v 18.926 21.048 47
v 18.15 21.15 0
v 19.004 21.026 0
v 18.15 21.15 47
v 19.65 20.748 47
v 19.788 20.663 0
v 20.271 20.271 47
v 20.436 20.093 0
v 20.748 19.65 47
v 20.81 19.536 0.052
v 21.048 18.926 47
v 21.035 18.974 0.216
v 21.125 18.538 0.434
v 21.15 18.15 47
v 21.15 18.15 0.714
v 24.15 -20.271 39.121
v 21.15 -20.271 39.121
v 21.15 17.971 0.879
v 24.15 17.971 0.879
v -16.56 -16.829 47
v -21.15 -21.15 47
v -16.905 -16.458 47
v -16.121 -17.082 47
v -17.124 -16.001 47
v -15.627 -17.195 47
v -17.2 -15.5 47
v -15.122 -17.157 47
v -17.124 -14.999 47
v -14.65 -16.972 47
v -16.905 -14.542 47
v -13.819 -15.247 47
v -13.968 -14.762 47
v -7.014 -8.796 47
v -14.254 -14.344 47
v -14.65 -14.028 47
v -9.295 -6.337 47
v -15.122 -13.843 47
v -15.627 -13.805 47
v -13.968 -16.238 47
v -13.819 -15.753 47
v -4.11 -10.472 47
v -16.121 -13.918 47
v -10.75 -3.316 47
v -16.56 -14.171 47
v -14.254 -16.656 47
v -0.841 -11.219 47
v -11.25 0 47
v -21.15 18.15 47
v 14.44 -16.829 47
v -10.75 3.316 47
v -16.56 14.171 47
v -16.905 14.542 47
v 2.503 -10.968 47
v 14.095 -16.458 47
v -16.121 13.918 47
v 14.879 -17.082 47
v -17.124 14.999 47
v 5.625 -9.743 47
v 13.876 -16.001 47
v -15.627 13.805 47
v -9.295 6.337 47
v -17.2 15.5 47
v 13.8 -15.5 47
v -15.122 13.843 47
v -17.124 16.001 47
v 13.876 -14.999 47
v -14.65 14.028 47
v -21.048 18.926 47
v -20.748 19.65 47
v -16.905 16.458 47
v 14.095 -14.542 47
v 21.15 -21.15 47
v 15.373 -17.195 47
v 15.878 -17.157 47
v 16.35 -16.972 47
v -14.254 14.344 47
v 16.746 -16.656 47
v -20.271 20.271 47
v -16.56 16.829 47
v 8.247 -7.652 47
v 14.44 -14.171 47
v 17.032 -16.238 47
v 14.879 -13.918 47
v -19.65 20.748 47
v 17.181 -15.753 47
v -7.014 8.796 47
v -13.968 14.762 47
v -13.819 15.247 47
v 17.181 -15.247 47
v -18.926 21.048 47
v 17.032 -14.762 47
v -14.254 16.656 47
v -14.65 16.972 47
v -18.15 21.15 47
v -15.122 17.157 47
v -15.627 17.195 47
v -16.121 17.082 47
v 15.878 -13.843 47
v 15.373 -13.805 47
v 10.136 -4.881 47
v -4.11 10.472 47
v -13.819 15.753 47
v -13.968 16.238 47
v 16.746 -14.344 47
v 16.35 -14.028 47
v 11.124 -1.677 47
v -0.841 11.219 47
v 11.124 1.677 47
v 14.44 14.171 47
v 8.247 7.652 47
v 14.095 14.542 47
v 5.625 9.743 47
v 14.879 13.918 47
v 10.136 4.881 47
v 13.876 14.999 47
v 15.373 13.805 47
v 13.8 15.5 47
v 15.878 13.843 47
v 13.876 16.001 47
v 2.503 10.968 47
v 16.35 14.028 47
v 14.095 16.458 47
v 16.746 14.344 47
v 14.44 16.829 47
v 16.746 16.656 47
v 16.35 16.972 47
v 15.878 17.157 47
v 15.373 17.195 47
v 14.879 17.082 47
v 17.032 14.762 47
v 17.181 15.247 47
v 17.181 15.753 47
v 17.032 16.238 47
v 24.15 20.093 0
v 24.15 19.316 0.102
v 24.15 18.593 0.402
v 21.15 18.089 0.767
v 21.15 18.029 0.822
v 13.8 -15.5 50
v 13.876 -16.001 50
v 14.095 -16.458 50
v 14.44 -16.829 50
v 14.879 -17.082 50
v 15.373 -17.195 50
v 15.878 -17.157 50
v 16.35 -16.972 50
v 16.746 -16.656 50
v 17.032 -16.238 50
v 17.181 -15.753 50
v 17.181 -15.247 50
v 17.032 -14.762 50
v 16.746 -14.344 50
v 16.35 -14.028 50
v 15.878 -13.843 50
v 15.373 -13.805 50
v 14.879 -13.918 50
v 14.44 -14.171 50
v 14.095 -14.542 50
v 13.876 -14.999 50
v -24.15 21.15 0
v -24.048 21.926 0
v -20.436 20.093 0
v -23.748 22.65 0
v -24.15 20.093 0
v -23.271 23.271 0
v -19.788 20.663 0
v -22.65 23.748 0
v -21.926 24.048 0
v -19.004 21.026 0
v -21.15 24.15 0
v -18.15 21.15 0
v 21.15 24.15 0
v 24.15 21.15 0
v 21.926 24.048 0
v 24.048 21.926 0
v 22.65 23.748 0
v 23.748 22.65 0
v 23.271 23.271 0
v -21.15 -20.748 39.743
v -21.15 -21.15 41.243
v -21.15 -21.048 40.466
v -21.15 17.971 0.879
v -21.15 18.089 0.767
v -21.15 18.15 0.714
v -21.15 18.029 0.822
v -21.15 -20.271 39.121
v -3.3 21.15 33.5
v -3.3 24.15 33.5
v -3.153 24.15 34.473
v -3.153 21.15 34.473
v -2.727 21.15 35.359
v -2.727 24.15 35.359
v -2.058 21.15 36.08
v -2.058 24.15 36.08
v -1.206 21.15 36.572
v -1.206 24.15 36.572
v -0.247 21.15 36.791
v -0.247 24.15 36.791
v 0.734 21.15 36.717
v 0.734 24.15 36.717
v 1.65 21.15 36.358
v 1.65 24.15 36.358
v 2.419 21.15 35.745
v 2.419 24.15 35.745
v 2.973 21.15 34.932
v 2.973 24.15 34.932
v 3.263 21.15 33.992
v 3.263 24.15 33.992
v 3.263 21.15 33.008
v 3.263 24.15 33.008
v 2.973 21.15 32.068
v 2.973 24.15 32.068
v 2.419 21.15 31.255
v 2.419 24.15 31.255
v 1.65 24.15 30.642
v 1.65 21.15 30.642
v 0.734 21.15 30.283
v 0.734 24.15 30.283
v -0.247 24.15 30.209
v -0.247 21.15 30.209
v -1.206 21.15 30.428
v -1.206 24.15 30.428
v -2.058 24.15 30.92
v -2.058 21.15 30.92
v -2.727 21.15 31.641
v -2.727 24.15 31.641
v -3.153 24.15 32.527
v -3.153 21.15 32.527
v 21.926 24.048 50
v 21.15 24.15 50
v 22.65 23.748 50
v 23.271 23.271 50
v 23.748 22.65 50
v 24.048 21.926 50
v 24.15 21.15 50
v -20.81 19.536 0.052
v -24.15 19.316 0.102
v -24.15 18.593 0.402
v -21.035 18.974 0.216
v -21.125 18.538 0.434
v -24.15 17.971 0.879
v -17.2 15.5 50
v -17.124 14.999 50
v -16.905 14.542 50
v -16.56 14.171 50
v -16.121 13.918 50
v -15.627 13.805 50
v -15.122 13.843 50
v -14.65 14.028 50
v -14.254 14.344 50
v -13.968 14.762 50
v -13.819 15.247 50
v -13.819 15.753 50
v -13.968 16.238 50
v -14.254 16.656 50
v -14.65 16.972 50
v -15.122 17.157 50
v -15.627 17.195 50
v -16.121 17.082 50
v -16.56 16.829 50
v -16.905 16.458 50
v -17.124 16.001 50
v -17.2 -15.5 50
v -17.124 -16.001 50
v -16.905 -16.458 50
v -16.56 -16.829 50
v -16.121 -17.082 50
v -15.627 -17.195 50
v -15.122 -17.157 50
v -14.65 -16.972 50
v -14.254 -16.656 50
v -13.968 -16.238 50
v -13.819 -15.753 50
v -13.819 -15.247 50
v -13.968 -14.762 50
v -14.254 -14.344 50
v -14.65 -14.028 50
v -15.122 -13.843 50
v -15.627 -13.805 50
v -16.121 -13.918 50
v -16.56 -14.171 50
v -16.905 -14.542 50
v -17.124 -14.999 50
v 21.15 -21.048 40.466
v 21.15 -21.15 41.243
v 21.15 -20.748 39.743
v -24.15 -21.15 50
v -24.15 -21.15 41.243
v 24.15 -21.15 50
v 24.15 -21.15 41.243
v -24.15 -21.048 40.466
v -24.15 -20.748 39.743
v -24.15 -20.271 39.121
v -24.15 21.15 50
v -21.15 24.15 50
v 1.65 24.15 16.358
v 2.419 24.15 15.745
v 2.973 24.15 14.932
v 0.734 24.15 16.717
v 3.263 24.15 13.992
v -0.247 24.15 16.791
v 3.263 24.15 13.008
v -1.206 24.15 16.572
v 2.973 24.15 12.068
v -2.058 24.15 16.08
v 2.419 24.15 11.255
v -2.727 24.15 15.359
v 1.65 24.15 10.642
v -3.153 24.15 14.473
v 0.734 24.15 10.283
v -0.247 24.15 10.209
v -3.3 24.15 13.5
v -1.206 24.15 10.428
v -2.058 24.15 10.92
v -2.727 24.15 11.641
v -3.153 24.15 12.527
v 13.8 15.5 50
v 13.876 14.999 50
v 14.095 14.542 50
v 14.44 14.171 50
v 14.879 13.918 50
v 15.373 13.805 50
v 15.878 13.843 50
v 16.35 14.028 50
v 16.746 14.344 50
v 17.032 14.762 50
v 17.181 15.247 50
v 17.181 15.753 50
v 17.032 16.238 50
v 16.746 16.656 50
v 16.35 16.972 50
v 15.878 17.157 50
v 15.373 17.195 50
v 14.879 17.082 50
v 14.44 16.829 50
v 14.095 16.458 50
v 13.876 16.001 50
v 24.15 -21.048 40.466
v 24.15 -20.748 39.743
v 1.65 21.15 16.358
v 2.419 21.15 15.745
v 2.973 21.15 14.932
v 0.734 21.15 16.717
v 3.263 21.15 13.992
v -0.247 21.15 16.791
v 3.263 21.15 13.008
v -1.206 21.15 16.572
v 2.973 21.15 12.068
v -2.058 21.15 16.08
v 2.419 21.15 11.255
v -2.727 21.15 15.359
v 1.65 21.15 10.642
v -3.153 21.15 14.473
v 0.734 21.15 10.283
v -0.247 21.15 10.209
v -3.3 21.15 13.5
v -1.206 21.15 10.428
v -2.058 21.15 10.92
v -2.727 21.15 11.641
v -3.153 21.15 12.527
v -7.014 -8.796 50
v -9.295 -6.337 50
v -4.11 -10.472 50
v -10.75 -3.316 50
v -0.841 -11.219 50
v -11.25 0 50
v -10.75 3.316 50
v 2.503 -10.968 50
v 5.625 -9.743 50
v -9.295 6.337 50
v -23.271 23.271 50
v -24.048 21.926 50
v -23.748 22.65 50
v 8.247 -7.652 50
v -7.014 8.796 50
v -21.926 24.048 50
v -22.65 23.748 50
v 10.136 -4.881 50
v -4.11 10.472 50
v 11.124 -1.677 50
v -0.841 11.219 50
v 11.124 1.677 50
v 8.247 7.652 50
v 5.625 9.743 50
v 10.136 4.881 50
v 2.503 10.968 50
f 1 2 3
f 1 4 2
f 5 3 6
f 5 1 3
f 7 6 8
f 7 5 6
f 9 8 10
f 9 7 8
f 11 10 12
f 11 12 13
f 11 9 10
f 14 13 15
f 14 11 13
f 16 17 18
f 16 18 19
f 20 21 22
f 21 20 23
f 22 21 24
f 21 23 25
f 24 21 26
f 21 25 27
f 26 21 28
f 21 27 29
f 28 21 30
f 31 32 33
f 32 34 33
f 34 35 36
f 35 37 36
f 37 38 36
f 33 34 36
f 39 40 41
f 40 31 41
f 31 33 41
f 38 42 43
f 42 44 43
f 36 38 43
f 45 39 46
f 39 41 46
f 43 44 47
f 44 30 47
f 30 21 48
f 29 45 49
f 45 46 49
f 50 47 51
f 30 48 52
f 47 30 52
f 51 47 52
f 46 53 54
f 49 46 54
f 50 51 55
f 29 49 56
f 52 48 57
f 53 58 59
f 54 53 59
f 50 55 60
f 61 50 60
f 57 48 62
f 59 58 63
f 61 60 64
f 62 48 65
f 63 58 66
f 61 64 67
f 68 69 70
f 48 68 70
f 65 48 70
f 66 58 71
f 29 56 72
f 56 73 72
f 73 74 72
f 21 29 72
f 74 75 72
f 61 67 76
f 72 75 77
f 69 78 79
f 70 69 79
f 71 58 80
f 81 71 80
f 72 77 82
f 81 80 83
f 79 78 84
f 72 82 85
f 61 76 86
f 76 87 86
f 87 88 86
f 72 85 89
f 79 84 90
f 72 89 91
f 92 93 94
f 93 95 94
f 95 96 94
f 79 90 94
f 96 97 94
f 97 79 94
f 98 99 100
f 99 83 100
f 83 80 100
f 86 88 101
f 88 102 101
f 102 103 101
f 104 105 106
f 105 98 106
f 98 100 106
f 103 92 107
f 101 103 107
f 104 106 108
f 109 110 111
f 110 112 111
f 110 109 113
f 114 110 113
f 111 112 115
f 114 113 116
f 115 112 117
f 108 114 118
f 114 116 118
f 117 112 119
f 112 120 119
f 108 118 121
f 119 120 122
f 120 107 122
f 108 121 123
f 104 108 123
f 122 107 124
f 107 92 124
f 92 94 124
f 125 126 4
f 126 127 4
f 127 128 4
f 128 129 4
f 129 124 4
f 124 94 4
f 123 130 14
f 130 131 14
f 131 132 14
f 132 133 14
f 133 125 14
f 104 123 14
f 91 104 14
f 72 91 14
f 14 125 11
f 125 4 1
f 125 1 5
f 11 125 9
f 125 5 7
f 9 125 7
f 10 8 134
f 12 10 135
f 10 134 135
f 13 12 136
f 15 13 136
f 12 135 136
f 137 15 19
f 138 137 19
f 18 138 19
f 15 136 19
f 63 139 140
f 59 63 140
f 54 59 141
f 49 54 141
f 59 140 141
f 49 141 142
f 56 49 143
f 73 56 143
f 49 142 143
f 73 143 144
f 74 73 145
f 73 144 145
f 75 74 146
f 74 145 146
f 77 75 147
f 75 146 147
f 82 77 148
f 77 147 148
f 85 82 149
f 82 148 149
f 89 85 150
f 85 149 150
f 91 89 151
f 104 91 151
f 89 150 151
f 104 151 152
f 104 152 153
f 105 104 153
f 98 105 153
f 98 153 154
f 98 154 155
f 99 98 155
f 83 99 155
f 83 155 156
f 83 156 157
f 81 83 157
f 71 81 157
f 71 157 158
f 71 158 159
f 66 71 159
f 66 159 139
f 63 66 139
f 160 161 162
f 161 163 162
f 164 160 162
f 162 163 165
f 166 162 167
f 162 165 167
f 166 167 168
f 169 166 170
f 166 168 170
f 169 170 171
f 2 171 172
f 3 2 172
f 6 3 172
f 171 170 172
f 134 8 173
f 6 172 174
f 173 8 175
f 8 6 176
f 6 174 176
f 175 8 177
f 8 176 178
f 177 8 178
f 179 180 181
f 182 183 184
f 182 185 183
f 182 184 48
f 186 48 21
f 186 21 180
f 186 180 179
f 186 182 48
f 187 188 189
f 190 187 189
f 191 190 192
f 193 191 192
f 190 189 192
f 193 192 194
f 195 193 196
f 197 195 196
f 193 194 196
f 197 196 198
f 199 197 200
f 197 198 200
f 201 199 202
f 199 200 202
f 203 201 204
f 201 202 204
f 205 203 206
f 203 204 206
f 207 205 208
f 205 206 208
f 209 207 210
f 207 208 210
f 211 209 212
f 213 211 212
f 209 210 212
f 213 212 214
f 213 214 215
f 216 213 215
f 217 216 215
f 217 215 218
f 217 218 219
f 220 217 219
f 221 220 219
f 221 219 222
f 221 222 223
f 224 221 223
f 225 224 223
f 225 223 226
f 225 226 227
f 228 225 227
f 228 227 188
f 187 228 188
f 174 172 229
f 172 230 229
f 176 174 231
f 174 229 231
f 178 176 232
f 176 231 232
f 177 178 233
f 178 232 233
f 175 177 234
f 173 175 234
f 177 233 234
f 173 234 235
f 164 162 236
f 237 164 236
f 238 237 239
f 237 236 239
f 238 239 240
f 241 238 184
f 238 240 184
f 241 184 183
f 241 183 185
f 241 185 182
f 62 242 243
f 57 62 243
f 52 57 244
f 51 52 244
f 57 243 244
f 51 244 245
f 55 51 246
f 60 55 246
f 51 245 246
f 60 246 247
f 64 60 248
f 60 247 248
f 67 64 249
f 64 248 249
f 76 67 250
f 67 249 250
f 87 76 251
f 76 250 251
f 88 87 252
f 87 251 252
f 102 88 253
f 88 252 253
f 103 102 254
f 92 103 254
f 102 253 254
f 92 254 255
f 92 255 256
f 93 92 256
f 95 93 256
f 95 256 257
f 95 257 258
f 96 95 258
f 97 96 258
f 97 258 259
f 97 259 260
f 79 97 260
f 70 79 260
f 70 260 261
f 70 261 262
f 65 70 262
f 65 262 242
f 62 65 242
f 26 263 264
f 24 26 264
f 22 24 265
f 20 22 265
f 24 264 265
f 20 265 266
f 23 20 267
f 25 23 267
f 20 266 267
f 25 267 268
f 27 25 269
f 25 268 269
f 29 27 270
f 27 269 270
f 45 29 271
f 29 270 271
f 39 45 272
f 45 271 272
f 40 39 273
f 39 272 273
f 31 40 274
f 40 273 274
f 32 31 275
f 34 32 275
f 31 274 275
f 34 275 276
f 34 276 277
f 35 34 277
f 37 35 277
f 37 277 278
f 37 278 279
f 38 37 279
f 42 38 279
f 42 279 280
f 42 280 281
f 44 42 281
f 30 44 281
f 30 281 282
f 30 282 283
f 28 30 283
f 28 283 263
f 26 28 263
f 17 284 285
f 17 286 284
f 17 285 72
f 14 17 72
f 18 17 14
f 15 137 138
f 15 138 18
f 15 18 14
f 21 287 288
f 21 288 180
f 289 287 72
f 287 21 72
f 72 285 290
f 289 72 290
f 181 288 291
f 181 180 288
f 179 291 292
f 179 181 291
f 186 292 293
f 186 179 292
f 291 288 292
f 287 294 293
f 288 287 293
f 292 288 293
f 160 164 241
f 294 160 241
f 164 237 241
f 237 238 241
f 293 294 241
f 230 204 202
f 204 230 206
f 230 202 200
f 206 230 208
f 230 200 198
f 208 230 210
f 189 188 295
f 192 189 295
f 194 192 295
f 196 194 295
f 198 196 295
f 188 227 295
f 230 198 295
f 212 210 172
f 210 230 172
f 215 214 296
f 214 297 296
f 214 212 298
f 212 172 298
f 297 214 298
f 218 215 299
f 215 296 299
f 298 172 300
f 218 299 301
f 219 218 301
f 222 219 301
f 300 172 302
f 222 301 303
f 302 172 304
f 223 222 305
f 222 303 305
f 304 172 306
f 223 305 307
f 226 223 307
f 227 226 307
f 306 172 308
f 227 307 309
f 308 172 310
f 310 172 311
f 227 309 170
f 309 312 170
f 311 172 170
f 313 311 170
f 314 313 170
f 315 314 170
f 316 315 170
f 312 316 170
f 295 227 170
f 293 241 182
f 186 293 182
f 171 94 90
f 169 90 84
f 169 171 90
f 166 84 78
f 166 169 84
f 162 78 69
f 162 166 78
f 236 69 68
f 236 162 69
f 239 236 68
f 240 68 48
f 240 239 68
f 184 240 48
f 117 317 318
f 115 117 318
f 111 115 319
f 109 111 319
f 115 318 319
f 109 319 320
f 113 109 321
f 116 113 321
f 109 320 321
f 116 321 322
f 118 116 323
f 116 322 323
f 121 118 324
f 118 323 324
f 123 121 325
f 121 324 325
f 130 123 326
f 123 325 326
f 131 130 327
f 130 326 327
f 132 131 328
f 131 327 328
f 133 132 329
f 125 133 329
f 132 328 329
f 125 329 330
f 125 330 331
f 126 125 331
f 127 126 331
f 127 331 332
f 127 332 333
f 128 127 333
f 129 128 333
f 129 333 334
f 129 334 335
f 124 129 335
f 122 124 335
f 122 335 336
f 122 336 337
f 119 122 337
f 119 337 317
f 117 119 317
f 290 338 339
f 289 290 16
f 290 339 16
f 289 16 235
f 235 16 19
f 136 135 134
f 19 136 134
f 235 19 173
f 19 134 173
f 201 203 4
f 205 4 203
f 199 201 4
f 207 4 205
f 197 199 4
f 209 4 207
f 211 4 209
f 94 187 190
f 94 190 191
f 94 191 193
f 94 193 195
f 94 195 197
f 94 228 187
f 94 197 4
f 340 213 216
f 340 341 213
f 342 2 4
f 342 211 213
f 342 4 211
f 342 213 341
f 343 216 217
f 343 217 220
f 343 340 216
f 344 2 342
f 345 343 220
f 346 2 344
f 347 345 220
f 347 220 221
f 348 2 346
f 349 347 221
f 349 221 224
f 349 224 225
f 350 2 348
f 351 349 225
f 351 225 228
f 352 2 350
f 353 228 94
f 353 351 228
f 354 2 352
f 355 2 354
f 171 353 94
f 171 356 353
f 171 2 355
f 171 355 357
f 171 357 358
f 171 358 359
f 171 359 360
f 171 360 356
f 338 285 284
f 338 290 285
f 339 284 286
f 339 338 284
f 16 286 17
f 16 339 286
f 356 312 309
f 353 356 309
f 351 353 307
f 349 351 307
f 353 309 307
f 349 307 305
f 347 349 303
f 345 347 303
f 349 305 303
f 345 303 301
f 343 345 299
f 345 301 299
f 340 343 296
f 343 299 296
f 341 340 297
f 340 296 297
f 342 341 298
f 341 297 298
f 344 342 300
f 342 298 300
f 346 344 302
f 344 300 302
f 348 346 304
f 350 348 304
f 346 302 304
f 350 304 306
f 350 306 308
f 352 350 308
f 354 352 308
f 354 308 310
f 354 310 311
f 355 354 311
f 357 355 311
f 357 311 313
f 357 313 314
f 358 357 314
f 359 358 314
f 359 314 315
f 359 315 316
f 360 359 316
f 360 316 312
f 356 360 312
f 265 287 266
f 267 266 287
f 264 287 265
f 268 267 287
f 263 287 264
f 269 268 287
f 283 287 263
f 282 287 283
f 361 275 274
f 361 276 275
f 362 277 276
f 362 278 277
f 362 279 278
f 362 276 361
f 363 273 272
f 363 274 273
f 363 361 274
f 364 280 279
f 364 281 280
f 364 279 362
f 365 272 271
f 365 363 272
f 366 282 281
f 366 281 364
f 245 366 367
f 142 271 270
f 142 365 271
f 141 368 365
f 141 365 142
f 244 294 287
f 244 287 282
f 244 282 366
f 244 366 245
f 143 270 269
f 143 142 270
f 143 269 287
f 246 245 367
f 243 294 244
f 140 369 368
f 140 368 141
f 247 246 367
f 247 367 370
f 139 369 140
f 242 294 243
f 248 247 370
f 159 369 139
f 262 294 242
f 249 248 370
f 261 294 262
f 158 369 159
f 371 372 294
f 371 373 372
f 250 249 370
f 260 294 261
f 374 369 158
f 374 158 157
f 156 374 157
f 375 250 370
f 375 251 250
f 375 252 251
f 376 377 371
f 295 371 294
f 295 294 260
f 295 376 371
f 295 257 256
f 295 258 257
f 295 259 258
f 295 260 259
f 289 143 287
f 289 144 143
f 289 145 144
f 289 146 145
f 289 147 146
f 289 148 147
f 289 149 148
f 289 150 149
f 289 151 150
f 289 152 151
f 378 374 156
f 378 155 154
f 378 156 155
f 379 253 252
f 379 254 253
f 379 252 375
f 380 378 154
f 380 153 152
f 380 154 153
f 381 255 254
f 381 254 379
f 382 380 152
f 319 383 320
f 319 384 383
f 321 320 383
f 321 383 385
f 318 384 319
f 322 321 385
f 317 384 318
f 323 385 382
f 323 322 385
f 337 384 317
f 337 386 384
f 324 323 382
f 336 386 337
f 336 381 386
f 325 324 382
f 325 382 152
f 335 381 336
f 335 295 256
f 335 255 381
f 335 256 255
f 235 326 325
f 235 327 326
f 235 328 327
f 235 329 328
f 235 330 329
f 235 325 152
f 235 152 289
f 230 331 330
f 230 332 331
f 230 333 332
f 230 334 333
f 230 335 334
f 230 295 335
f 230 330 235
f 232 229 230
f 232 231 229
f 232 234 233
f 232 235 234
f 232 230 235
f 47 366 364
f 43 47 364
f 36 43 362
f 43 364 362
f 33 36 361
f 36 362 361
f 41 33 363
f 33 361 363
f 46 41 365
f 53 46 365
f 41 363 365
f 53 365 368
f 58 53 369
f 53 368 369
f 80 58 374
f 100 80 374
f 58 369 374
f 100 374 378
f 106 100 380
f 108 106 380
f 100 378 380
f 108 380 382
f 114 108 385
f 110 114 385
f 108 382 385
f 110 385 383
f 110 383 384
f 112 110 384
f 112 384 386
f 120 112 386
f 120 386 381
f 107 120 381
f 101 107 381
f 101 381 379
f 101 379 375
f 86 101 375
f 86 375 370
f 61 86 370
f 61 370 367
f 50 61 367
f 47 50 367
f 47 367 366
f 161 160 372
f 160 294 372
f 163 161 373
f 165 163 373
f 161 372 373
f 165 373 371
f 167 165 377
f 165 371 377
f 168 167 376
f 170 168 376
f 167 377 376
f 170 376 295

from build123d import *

# Parameters (mm, degrees)
F1_W     = 42.3
F1_H     = 42.3
F1_R     = 1.625
F2_DEPTH = 50
F4_T     = -3
F5_D     = 3.4
F6_D     = 6.6
F7_D     = 22.5
F8_SIZE  = 40
F9_R     = 3


with BuildPart() as f2:
    # F1 (on Top) → F2 (new body)
    with BuildSketch(Plane.XY):
        Rectangle(F1_W, F1_H)
        with Locations((-15.5, -15.5)):
            Circle(F1_R, mode=Mode.SUBTRACT)
        with Locations((15.5, -15.5)):
            Circle(F1_R, mode=Mode.SUBTRACT)
        with Locations((-15.5, 15.5)):
            Circle(F1_R, mode=Mode.SUBTRACT)
        with Locations((15.5, 15.5)):
            Circle(F1_R, mode=Mode.SUBTRACT)
        with Locations((-15.5, 15.5)):
            Circle(F1_R)
        with Locations((15.5, 15.5)):
            Circle(F1_R)
        with Locations((-15.5, -15.5)):
            Circle(F1_R)
        with Locations((15.5, -15.5)):
            Circle(F1_R)
        Polygon((-21.15, 21.15), (21.15, 21.15), (21.15, -21.15), (24.15, -21.15), (24.15, 24.15), (-24.15, 24.15), (-24.15, -21.15), (-21.15, -21.15), align=None)
    extrude(amount=F2_DEPTH)

    # F4
    f4_openings = [f2.faces().sort_by_distance(p)[0] for p in [
        (0, -21.15, 25),
        (0, 1.5, 0),
    ]]
    offset(amount=F4_T, openings=f4_openings)

    # F5 (through all)
    with Locations(Plane(origin=(0, 0, 0), x_dir=(1, 0, 0), z_dir=(0, 0, -1))):
        with Locations((-15.5, 15.5), (15.5, 15.5), (15.5, -15.5), (-15.5, -15.5)):
            Hole(F5_D / 2)

    # F6 (through all)
    with Locations(Plane.XZ.offset(21.15)):
        with Locations((0, 33.5), (0, 13.5)):
            Hole(F6_D / 2)

    # F7 (through all)
    with Locations(Plane(origin=(0, 0, 0), x_dir=(1, 0, 0), z_dir=(0, 0, -1))):
        with Locations((0, 0)):
            Hole(F7_D / 2)

    # F8
    f8_edges = [f2.edges().sort_by_distance(p)[0] for p in [
        (-22.65, -21.15, 0),
        (22.65, -21.15, 0),
    ]]
    chamfer(f8_edges, length=F8_SIZE)

    # F9 (call 1 of 8: OpenCascade refuses the feature's edges together)
    f9_edges = [f2.edges().sort_by_distance(p)[0] for p in [
        (-22.65, -21.15, 40),
    ]]
    fillet(f9_edges, radius=F9_R)

    # F9#2 (call 2 of 8)
    f9_2_edges = [f2.edges().sort_by_distance(p)[0] for p in [
        (22.65, -21.15, 40),
    ]]
    fillet(f9_2_edges, radius=F9_R)

    # F9#3 (call 3 of 8)
    f9_3_edges = [f2.edges().sort_by_distance(p)[0] for p in [
        (-22.65, 18.85, 0),
    ]]
    fillet(f9_3_edges, radius=F9_R)

    # F9#4 (call 4 of 8)
    f9_4_edges = [f2.edges().sort_by_distance(p)[0] for p in [
        (22.65, 18.85, 0),
    ]]
    fillet(f9_4_edges, radius=F9_R)

    # F9#5 (call 5 of 8)
    f9_5_edges = [f2.edges().sort_by_distance(p)[0] for p in [
        (-21.15, 21.15, 23.5),
    ]]
    fillet(f9_5_edges, radius=F9_R)

    # F9#6 (call 6 of 8)
    f9_6_edges = [f2.edges().sort_by_distance(p)[0] for p in [
        (21.15, 21.15, 23.5),
    ]]
    fillet(f9_6_edges, radius=F9_R)

    # F9#7 (call 7 of 8)
    f9_7_edges = [f2.edges().sort_by_distance(p)[0] for p in [
        (-24.15, 24.15, 25),
    ]]
    fillet(f9_7_edges, radius=F9_R)

    # F9#8 (call 8 of 8)
    f9_8_edges = [f2.edges().sort_by_distance(p)[0] for p in [
        (24.15, 24.15, 25),
    ]]
    fillet(f9_8_edges, radius=F9_R)


solid = f2.part
